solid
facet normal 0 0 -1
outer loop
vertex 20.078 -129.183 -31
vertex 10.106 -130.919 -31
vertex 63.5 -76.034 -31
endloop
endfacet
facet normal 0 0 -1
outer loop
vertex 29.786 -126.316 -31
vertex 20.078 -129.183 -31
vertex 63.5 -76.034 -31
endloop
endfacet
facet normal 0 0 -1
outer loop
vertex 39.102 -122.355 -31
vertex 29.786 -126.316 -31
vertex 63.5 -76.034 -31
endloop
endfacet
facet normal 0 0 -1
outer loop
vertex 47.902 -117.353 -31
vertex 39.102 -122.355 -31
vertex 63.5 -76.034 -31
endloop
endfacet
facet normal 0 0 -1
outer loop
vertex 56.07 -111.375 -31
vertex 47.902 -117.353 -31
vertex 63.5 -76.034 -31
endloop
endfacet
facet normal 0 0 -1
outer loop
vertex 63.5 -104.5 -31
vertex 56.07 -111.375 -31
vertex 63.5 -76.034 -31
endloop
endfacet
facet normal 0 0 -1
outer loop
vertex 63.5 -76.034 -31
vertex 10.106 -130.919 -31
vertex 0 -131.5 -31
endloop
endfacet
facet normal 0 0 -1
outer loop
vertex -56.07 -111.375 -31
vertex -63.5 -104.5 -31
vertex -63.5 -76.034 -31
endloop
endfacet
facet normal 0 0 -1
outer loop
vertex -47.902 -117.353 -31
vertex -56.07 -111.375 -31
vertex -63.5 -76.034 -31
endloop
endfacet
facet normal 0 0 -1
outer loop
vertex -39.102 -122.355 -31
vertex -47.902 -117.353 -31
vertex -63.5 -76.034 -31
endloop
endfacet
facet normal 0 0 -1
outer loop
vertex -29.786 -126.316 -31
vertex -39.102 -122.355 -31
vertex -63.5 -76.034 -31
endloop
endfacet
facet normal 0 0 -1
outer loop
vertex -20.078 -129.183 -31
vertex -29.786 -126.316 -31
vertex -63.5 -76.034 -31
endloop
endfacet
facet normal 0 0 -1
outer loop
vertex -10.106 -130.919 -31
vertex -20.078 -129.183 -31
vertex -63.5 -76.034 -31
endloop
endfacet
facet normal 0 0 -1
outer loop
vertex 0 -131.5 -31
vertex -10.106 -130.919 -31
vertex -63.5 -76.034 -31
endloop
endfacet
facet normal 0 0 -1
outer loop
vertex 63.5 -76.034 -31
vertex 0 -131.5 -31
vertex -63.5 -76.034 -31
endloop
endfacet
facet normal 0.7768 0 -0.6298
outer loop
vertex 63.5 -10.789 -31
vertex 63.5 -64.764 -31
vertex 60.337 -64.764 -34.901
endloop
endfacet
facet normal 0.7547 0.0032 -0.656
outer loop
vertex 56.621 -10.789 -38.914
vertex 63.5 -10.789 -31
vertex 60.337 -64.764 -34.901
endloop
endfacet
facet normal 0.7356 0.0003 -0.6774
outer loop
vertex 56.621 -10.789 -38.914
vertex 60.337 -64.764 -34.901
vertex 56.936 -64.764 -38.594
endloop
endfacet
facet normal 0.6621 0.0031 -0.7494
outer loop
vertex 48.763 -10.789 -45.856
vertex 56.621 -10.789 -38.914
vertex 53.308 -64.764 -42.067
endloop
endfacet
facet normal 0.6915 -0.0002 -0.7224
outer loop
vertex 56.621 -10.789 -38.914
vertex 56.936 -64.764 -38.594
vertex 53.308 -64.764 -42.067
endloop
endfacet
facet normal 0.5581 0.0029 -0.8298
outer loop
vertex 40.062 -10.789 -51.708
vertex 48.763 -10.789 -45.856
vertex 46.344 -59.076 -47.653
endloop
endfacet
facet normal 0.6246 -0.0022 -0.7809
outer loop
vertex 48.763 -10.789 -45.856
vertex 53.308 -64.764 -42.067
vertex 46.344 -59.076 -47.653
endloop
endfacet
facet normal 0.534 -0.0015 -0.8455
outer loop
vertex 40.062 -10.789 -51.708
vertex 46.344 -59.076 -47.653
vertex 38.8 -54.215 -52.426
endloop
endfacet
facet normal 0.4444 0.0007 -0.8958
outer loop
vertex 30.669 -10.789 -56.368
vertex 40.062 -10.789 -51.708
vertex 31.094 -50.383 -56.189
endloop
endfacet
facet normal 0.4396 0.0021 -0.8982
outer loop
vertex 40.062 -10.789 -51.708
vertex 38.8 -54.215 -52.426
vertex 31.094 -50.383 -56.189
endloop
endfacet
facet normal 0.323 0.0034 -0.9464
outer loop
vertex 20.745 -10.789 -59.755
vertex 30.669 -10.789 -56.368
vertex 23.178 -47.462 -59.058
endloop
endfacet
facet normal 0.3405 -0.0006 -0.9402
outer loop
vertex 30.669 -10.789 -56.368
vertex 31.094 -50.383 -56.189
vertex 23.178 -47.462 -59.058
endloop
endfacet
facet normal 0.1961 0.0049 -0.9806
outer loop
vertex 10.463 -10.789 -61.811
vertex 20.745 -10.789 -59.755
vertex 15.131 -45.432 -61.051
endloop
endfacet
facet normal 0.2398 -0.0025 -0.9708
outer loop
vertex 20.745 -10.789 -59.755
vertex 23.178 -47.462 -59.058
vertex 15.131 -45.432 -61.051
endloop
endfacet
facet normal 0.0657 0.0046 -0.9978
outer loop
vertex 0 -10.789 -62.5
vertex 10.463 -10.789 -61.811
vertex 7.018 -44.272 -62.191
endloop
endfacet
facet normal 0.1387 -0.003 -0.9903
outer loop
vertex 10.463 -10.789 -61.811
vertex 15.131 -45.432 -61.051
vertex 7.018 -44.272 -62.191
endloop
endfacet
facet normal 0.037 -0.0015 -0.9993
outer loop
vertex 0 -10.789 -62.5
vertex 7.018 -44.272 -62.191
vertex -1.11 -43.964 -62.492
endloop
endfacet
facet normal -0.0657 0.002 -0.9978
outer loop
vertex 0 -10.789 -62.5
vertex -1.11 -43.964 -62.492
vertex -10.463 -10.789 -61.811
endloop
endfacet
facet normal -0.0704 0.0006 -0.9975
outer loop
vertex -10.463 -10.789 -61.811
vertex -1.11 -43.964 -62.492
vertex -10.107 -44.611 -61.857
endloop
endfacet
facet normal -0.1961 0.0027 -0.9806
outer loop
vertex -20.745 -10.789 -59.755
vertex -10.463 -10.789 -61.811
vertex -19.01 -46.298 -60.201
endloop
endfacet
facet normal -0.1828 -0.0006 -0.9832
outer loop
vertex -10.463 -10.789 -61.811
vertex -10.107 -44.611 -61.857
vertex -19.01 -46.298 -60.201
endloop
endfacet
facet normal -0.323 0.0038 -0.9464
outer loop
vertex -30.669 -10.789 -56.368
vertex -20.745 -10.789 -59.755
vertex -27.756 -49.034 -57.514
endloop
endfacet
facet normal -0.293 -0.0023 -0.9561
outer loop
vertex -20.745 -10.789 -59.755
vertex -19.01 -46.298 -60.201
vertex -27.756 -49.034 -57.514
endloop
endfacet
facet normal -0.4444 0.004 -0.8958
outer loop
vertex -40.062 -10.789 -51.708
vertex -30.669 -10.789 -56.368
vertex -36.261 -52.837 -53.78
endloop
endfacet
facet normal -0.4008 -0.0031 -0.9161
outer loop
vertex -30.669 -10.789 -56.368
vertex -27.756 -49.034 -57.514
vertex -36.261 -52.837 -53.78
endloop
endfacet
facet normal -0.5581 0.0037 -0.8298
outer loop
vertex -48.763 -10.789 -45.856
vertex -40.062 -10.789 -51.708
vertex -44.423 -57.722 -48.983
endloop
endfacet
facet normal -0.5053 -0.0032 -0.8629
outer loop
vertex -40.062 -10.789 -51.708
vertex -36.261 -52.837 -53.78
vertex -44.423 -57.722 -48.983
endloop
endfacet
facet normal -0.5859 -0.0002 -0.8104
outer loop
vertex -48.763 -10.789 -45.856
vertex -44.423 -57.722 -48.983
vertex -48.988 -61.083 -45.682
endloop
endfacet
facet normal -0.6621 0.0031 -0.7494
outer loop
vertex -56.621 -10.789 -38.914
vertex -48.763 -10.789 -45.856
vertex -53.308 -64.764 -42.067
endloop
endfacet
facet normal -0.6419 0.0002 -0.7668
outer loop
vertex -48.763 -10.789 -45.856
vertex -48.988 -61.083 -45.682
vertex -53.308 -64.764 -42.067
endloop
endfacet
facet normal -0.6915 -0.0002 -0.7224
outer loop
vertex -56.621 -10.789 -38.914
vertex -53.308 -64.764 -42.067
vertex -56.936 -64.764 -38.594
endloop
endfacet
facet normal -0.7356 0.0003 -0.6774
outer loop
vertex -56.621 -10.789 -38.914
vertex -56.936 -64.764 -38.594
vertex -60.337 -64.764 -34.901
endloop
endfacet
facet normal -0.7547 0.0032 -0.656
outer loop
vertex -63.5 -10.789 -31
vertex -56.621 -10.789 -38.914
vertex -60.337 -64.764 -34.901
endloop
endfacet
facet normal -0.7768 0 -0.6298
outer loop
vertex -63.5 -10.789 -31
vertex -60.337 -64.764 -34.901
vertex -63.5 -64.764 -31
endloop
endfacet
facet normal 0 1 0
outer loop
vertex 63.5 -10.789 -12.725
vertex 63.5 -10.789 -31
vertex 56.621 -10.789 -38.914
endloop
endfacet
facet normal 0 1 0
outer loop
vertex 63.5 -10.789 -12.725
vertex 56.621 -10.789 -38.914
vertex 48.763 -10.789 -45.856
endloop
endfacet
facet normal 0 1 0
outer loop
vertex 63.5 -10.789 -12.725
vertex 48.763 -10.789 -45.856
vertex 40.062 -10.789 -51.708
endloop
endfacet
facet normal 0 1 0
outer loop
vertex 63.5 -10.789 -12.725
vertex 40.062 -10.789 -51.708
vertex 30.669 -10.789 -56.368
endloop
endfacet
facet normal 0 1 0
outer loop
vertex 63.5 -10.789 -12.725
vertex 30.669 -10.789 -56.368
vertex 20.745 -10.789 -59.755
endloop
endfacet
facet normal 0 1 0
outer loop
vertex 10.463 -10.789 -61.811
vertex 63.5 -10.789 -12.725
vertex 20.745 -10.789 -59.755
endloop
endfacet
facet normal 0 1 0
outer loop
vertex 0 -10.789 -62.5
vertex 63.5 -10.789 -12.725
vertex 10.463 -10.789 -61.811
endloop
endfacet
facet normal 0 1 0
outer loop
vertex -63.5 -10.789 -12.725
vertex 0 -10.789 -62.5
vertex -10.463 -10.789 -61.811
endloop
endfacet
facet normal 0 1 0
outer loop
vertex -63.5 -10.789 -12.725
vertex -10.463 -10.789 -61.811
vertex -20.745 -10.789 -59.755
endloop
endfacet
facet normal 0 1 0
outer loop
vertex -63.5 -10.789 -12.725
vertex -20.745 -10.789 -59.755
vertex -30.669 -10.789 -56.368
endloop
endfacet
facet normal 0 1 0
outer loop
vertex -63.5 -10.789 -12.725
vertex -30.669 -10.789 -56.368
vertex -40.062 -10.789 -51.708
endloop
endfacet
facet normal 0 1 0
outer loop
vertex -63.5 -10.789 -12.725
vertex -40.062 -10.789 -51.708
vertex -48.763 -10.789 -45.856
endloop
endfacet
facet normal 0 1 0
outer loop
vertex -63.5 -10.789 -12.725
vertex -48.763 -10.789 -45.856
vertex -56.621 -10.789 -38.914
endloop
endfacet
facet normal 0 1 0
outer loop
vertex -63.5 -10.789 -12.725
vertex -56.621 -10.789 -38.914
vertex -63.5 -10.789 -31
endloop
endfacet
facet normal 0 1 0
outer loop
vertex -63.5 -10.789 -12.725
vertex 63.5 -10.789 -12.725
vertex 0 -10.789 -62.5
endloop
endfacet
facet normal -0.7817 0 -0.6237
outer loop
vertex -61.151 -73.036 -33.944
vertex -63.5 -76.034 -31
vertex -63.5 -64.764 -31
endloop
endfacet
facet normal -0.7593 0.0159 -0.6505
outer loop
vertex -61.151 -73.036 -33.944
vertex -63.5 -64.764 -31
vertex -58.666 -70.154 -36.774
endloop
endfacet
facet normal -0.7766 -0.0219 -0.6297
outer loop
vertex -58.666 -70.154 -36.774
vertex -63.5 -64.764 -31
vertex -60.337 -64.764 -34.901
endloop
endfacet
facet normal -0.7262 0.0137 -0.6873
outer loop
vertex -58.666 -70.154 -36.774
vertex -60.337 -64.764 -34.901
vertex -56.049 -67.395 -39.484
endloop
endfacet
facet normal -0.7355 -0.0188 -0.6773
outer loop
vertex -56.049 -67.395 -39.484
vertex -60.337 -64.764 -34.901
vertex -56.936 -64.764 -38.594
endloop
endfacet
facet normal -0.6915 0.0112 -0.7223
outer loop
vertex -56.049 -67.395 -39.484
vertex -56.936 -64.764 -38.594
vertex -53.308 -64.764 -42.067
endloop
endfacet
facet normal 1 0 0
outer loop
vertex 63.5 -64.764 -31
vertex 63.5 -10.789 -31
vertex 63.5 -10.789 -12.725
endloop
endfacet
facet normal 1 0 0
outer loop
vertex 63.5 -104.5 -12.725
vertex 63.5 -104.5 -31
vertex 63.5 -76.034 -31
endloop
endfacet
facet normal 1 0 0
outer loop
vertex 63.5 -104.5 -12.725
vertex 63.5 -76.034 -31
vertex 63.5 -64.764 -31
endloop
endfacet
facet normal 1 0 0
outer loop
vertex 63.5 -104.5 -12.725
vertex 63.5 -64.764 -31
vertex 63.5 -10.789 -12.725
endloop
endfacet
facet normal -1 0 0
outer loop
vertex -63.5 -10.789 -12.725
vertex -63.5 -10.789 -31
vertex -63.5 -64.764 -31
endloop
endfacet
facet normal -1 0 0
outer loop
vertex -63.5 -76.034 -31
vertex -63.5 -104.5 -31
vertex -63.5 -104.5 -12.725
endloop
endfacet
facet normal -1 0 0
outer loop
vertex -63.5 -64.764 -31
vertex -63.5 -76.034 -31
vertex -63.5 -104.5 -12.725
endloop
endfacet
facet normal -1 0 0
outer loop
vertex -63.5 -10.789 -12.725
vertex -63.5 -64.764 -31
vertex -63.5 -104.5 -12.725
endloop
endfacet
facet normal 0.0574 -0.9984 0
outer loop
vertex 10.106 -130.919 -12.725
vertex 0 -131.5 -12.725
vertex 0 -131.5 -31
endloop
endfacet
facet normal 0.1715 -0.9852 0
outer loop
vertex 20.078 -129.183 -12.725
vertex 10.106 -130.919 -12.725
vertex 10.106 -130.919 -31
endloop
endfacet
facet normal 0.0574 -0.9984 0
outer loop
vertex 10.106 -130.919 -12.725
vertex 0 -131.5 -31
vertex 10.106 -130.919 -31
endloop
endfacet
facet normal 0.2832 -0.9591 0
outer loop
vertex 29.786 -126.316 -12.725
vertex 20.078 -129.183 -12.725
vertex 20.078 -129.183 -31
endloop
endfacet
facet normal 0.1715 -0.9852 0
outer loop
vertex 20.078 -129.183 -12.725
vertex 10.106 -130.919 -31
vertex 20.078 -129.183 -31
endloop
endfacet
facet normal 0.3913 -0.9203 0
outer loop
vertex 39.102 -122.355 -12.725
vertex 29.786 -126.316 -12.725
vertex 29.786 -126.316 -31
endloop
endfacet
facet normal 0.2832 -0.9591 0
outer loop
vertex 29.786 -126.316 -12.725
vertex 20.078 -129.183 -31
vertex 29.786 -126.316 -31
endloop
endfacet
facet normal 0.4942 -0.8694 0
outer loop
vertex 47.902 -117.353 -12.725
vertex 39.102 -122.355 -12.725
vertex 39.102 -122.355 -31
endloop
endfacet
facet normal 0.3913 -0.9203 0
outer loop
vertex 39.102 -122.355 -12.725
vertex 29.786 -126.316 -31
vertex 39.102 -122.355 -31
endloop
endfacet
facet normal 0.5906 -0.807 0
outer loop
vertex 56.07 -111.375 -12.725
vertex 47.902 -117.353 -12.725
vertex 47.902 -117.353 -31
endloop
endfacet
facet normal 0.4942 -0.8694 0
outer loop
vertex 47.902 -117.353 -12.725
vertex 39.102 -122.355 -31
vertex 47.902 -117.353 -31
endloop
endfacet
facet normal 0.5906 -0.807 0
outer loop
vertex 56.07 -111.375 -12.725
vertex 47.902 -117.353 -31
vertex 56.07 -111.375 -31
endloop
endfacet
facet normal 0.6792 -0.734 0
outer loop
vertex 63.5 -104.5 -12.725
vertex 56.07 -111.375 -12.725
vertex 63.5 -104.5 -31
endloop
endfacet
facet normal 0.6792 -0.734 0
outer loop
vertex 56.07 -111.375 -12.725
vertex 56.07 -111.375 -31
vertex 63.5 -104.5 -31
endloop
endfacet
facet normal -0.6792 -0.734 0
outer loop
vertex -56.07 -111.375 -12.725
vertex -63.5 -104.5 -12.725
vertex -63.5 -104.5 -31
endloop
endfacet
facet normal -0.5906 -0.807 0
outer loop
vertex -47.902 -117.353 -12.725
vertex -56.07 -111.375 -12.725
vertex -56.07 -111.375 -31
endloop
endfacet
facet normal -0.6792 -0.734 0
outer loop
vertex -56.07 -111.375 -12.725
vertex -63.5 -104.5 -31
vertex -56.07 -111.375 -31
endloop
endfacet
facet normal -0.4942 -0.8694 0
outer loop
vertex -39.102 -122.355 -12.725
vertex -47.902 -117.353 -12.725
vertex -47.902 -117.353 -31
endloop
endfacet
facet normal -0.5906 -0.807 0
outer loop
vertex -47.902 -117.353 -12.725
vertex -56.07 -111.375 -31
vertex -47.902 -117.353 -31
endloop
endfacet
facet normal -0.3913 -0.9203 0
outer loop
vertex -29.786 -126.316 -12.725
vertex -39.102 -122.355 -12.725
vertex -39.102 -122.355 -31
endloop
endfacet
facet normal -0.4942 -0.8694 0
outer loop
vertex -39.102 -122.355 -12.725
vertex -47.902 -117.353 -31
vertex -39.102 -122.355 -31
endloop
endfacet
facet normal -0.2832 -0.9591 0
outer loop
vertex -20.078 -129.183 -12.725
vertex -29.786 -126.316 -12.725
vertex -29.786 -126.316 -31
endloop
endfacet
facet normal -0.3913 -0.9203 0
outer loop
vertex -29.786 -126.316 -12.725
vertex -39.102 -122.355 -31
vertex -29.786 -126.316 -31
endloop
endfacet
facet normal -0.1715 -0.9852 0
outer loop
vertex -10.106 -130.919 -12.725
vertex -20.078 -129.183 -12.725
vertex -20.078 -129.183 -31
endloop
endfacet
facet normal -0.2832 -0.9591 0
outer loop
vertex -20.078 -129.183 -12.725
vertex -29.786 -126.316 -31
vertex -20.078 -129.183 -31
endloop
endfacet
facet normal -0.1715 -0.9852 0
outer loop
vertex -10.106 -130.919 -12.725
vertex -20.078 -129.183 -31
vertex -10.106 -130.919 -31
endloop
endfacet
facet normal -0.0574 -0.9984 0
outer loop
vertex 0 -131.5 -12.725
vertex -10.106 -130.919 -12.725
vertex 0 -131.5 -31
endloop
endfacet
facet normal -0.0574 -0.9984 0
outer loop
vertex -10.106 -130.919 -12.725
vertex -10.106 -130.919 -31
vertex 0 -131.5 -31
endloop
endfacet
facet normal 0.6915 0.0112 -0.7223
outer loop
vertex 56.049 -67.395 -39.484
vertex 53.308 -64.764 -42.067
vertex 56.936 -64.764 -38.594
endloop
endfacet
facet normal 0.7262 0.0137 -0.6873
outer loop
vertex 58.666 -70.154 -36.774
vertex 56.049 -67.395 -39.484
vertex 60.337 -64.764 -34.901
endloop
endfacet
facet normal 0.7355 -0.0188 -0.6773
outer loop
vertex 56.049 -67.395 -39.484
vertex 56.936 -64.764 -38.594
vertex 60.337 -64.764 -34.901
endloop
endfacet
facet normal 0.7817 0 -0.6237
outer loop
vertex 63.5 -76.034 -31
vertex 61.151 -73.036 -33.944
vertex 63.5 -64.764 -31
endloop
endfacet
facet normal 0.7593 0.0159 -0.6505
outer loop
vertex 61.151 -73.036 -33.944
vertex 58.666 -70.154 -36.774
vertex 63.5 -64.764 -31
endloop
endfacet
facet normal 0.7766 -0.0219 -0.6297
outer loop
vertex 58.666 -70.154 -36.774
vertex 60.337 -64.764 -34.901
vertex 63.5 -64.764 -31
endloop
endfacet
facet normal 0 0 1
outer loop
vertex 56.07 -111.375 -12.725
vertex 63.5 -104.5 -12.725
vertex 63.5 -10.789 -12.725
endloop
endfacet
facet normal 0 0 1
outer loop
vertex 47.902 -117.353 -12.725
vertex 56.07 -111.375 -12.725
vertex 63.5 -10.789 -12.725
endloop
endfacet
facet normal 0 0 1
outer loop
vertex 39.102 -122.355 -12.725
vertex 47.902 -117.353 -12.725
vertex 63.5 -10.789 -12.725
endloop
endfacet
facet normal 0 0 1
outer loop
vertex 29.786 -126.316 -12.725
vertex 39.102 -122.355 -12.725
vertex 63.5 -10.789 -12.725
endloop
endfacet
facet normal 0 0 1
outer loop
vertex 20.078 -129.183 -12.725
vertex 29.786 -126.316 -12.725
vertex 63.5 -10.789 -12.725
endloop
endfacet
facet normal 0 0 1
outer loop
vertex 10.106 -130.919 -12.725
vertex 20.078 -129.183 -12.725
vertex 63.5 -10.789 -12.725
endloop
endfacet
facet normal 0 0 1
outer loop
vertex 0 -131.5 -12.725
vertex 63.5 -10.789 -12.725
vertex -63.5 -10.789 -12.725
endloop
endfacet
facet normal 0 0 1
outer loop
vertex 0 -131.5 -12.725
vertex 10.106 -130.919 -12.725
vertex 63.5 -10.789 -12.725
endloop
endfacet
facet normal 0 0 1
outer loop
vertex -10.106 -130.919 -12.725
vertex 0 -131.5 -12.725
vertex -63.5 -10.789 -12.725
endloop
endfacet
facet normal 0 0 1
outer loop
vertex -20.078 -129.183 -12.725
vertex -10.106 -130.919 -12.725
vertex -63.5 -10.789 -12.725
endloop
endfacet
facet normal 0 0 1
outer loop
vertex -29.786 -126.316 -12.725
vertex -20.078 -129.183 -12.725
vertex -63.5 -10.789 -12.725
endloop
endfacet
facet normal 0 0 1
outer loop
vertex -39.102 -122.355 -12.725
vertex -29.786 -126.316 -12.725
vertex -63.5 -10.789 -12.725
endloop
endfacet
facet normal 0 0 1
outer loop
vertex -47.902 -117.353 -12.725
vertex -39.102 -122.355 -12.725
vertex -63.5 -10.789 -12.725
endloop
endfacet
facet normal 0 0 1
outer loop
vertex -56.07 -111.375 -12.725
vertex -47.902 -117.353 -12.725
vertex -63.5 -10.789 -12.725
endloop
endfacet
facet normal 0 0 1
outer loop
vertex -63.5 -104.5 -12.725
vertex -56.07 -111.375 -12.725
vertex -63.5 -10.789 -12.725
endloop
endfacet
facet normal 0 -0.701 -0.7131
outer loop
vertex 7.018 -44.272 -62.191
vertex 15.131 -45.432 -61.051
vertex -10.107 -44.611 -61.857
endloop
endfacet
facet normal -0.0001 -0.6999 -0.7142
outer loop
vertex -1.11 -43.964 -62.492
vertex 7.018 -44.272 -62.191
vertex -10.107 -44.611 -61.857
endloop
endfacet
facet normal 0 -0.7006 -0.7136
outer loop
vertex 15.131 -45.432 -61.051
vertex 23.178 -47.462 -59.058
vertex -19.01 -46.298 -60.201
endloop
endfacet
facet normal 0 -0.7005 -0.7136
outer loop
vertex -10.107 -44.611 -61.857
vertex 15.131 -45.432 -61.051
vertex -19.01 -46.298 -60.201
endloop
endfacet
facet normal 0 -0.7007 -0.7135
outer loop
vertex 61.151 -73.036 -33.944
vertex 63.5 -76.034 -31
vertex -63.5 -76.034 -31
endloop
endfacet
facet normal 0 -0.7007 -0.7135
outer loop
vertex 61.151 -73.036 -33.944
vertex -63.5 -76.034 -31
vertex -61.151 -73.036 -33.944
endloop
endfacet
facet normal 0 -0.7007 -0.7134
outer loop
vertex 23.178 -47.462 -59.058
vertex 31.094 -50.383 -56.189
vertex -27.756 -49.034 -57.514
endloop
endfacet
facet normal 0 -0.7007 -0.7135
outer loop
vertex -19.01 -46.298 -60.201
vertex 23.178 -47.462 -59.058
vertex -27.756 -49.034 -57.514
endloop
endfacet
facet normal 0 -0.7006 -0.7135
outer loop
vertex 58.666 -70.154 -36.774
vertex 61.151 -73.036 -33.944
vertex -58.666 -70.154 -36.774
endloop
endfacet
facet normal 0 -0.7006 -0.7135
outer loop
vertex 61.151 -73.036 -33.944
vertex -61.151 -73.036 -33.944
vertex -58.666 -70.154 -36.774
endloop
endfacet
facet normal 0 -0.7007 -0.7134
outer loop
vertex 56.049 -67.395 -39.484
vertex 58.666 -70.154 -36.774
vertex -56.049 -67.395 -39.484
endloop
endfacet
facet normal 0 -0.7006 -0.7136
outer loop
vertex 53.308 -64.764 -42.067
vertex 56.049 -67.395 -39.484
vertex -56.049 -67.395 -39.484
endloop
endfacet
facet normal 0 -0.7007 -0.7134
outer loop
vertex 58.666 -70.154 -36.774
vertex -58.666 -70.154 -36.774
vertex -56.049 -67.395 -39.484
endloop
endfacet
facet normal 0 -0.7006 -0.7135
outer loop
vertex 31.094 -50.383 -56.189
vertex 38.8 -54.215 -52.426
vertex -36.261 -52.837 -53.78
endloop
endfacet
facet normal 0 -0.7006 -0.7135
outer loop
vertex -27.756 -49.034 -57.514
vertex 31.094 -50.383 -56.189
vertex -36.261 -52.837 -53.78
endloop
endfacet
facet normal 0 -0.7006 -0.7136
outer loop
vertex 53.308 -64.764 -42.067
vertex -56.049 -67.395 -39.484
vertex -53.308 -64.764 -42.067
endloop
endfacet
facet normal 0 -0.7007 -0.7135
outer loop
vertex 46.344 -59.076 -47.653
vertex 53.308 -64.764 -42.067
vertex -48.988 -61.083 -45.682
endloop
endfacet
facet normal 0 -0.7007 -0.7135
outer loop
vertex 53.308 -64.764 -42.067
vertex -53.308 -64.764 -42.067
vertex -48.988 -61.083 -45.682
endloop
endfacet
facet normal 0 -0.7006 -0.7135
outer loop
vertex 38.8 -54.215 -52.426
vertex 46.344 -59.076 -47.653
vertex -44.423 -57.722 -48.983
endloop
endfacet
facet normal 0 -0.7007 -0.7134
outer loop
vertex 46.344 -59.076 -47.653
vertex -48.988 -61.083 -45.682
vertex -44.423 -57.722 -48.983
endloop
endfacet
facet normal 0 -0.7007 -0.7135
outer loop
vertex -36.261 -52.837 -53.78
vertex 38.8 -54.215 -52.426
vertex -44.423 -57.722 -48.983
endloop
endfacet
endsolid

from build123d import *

# Parameters (mm, degrees)
F1_DEPTH  = 104.5
F3_DEPTH  = 127.001
F4_W      = 127
F4_H      = 62
F5_DEPTH  = 27
F7_DEPTH  = 93.5104
F8_W      = 237.597823
F8_H      = 212.603942
F9_DEPTH  = 64.76446
F11_DEPTH = 127.001
F12_DEPTH = 25.4
F13_W     = 127
F13_H     = 18.2746
F14_DEPTH = 28.575
F16_DEPTH = 127.001


with BuildPart() as f1:
    # F0 (on Front) → F1 (new body)
    with BuildSketch(Plane.XZ):
        with BuildLine():
            ThreePointArc((0, 62.5094), (-35.443943, 54.198998), (-63.5, 31))
            Line((-63.5, 31), (0, 31))
            Line((0, 31), (0, 62.5094))
        make_face()
        Polygon((0, 31), (-63.5, 31), (-63.5, -31), (0, -31), (0, 0), align=None)
        with BuildLine():
            Line((0, 62.5094), (0, 31))
            Line((0, 31), (63.5, 31))
            ThreePointArc((63.5, 31), (35.443943, 54.198998), (0, 62.5094))
        make_face()
        Polygon((63.5, 31), (0, 31), (0, 0), (0, -31), (63.5, -31), align=None)
        with BuildLine():
            Line((0, -31), (-63.5, -31))
            ThreePointArc((-63.5, -31), (-35.441854, -54.192308), (0, -62.5))
            Line((0, -62.5), (0, -31))
        make_face()
        with BuildLine():
            Line((63.5, -31), (0, -31))
            Line((0, -31), (0, -62.5))
            ThreePointArc((0, -62.5), (35.441854, -54.192308), (63.5, -31))
        make_face()
    extrude(amount=F1_DEPTH)

    # F2 (on face) → F3 (cut, through all)
    with BuildSketch(Plane.YZ.offset(63.5)):
        Polygon((-104.5, 72.844587), (-104.5, 31), (-62.5, 64.333223), align=None)
        Polygon((-62.5, -65.093011), (-104.5, -31), (-104.5, -67.313612), align=None)
    extrude(amount=-F3_DEPTH, mode=Mode.SUBTRACT)

    # F4 (on face) → F5 (join)
    with BuildSketch(Plane.XZ.offset(104.5)):
        Rectangle(F4_W, F4_H)
    extrude(amount=F5_DEPTH)

    # F6 (on face) → F7 (cut, through all)
    with BuildSketch(Plane(origin=(0, 0, -31), x_dir=(1, 0, 0), z_dir=(0, 0, -1))):
        with BuildLine():
            ThreePointArc((-63.5, 104.5), (-34.500906, 124.469723), (0, 131.5))
            Line((0, 131.5), (-63.5, 131.5))
            Line((-63.5, 131.5), (-63.5, 104.5))
        make_face()
        with BuildLine():
            ThreePointArc((0, 131.5), (34.500906, 124.469723), (63.5, 104.5))
            Line((63.5, 104.5), (63.5, 131.5))
            Line((63.5, 131.5), (0, 131.5))
        make_face()
    extrude(amount=-F7_DEPTH, mode=Mode.SUBTRACT)

    # F8 (on face) → F9 (cut)
    with BuildSketch(Plane(origin=(0, 0, 0), x_dir=(-1, 0, 0), z_dir=(0, 1, 0))):
        with Locations((30.433759, -29.178329)):
            Rectangle(F8_W, F8_H)
    extrude(amount=-F9_DEPTH, mode=Mode.SUBTRACT)

    # F10 (on face) → F11 (cut, through all)
    with BuildSketch(Plane.YZ.offset(63.5)):
        Polygon((-64.76446, -12.7254), (-64.76446, 0), (-64.76446, 76.2), (-148.139939, 76.2), (-148.139939, -12.7254), align=None)
    extrude(amount=-F11_DEPTH, mode=Mode.SUBTRACT)

    # F9_face (on face) → F12 (join)
    with BuildSketch(Plane(origin=(0, -64.76446, -33.868347), x_dir=(-1, 0, 0), z_dir=(0, 1, 0))):
        with BuildLine():
            ThreePointArc((-63.5, 2.868347), (0, -28.631653), (63.5, 2.868347))
            Line((63.5, 2.868347), (63.5, 21.142947))
            Line((63.5, 21.142947), (-63.5, 21.142947))
            Line((-63.5, 21.142947), (-63.5, 2.868347))
        make_face()
    extrude(amount=F12_DEPTH)

    # F13 (on face) → F14 (join)
    with BuildSketch(Plane(origin=(0, -39.36446, 0), x_dir=(-1, 0, 0), z_dir=(0, 1, 0))):
        with BuildLine():
            ThreePointArc((-63.5, -31), (0, -62.5), (63.5, -31))
            Line((63.5, -31), (-63.5, -31))
        make_face()
        with Locations((0, -21.8627)):
            Rectangle(F13_W, F13_H)
    extrude(amount=F14_DEPTH)

    # F15 (on face) → F16 (cut, through all)
    with BuildSketch(Plane(origin=(-63.5, 0, 0), x_dir=(0, -1, 0), z_dir=(-1, 0, 0))):
        Polygon((104.02593, -67.289479), (104.5, -31), (76.034166, -31), (42.225931, -64.199477), align=None)
    extrude(amount=-F16_DEPTH, mode=Mode.SUBTRACT)


solid = f1.part
